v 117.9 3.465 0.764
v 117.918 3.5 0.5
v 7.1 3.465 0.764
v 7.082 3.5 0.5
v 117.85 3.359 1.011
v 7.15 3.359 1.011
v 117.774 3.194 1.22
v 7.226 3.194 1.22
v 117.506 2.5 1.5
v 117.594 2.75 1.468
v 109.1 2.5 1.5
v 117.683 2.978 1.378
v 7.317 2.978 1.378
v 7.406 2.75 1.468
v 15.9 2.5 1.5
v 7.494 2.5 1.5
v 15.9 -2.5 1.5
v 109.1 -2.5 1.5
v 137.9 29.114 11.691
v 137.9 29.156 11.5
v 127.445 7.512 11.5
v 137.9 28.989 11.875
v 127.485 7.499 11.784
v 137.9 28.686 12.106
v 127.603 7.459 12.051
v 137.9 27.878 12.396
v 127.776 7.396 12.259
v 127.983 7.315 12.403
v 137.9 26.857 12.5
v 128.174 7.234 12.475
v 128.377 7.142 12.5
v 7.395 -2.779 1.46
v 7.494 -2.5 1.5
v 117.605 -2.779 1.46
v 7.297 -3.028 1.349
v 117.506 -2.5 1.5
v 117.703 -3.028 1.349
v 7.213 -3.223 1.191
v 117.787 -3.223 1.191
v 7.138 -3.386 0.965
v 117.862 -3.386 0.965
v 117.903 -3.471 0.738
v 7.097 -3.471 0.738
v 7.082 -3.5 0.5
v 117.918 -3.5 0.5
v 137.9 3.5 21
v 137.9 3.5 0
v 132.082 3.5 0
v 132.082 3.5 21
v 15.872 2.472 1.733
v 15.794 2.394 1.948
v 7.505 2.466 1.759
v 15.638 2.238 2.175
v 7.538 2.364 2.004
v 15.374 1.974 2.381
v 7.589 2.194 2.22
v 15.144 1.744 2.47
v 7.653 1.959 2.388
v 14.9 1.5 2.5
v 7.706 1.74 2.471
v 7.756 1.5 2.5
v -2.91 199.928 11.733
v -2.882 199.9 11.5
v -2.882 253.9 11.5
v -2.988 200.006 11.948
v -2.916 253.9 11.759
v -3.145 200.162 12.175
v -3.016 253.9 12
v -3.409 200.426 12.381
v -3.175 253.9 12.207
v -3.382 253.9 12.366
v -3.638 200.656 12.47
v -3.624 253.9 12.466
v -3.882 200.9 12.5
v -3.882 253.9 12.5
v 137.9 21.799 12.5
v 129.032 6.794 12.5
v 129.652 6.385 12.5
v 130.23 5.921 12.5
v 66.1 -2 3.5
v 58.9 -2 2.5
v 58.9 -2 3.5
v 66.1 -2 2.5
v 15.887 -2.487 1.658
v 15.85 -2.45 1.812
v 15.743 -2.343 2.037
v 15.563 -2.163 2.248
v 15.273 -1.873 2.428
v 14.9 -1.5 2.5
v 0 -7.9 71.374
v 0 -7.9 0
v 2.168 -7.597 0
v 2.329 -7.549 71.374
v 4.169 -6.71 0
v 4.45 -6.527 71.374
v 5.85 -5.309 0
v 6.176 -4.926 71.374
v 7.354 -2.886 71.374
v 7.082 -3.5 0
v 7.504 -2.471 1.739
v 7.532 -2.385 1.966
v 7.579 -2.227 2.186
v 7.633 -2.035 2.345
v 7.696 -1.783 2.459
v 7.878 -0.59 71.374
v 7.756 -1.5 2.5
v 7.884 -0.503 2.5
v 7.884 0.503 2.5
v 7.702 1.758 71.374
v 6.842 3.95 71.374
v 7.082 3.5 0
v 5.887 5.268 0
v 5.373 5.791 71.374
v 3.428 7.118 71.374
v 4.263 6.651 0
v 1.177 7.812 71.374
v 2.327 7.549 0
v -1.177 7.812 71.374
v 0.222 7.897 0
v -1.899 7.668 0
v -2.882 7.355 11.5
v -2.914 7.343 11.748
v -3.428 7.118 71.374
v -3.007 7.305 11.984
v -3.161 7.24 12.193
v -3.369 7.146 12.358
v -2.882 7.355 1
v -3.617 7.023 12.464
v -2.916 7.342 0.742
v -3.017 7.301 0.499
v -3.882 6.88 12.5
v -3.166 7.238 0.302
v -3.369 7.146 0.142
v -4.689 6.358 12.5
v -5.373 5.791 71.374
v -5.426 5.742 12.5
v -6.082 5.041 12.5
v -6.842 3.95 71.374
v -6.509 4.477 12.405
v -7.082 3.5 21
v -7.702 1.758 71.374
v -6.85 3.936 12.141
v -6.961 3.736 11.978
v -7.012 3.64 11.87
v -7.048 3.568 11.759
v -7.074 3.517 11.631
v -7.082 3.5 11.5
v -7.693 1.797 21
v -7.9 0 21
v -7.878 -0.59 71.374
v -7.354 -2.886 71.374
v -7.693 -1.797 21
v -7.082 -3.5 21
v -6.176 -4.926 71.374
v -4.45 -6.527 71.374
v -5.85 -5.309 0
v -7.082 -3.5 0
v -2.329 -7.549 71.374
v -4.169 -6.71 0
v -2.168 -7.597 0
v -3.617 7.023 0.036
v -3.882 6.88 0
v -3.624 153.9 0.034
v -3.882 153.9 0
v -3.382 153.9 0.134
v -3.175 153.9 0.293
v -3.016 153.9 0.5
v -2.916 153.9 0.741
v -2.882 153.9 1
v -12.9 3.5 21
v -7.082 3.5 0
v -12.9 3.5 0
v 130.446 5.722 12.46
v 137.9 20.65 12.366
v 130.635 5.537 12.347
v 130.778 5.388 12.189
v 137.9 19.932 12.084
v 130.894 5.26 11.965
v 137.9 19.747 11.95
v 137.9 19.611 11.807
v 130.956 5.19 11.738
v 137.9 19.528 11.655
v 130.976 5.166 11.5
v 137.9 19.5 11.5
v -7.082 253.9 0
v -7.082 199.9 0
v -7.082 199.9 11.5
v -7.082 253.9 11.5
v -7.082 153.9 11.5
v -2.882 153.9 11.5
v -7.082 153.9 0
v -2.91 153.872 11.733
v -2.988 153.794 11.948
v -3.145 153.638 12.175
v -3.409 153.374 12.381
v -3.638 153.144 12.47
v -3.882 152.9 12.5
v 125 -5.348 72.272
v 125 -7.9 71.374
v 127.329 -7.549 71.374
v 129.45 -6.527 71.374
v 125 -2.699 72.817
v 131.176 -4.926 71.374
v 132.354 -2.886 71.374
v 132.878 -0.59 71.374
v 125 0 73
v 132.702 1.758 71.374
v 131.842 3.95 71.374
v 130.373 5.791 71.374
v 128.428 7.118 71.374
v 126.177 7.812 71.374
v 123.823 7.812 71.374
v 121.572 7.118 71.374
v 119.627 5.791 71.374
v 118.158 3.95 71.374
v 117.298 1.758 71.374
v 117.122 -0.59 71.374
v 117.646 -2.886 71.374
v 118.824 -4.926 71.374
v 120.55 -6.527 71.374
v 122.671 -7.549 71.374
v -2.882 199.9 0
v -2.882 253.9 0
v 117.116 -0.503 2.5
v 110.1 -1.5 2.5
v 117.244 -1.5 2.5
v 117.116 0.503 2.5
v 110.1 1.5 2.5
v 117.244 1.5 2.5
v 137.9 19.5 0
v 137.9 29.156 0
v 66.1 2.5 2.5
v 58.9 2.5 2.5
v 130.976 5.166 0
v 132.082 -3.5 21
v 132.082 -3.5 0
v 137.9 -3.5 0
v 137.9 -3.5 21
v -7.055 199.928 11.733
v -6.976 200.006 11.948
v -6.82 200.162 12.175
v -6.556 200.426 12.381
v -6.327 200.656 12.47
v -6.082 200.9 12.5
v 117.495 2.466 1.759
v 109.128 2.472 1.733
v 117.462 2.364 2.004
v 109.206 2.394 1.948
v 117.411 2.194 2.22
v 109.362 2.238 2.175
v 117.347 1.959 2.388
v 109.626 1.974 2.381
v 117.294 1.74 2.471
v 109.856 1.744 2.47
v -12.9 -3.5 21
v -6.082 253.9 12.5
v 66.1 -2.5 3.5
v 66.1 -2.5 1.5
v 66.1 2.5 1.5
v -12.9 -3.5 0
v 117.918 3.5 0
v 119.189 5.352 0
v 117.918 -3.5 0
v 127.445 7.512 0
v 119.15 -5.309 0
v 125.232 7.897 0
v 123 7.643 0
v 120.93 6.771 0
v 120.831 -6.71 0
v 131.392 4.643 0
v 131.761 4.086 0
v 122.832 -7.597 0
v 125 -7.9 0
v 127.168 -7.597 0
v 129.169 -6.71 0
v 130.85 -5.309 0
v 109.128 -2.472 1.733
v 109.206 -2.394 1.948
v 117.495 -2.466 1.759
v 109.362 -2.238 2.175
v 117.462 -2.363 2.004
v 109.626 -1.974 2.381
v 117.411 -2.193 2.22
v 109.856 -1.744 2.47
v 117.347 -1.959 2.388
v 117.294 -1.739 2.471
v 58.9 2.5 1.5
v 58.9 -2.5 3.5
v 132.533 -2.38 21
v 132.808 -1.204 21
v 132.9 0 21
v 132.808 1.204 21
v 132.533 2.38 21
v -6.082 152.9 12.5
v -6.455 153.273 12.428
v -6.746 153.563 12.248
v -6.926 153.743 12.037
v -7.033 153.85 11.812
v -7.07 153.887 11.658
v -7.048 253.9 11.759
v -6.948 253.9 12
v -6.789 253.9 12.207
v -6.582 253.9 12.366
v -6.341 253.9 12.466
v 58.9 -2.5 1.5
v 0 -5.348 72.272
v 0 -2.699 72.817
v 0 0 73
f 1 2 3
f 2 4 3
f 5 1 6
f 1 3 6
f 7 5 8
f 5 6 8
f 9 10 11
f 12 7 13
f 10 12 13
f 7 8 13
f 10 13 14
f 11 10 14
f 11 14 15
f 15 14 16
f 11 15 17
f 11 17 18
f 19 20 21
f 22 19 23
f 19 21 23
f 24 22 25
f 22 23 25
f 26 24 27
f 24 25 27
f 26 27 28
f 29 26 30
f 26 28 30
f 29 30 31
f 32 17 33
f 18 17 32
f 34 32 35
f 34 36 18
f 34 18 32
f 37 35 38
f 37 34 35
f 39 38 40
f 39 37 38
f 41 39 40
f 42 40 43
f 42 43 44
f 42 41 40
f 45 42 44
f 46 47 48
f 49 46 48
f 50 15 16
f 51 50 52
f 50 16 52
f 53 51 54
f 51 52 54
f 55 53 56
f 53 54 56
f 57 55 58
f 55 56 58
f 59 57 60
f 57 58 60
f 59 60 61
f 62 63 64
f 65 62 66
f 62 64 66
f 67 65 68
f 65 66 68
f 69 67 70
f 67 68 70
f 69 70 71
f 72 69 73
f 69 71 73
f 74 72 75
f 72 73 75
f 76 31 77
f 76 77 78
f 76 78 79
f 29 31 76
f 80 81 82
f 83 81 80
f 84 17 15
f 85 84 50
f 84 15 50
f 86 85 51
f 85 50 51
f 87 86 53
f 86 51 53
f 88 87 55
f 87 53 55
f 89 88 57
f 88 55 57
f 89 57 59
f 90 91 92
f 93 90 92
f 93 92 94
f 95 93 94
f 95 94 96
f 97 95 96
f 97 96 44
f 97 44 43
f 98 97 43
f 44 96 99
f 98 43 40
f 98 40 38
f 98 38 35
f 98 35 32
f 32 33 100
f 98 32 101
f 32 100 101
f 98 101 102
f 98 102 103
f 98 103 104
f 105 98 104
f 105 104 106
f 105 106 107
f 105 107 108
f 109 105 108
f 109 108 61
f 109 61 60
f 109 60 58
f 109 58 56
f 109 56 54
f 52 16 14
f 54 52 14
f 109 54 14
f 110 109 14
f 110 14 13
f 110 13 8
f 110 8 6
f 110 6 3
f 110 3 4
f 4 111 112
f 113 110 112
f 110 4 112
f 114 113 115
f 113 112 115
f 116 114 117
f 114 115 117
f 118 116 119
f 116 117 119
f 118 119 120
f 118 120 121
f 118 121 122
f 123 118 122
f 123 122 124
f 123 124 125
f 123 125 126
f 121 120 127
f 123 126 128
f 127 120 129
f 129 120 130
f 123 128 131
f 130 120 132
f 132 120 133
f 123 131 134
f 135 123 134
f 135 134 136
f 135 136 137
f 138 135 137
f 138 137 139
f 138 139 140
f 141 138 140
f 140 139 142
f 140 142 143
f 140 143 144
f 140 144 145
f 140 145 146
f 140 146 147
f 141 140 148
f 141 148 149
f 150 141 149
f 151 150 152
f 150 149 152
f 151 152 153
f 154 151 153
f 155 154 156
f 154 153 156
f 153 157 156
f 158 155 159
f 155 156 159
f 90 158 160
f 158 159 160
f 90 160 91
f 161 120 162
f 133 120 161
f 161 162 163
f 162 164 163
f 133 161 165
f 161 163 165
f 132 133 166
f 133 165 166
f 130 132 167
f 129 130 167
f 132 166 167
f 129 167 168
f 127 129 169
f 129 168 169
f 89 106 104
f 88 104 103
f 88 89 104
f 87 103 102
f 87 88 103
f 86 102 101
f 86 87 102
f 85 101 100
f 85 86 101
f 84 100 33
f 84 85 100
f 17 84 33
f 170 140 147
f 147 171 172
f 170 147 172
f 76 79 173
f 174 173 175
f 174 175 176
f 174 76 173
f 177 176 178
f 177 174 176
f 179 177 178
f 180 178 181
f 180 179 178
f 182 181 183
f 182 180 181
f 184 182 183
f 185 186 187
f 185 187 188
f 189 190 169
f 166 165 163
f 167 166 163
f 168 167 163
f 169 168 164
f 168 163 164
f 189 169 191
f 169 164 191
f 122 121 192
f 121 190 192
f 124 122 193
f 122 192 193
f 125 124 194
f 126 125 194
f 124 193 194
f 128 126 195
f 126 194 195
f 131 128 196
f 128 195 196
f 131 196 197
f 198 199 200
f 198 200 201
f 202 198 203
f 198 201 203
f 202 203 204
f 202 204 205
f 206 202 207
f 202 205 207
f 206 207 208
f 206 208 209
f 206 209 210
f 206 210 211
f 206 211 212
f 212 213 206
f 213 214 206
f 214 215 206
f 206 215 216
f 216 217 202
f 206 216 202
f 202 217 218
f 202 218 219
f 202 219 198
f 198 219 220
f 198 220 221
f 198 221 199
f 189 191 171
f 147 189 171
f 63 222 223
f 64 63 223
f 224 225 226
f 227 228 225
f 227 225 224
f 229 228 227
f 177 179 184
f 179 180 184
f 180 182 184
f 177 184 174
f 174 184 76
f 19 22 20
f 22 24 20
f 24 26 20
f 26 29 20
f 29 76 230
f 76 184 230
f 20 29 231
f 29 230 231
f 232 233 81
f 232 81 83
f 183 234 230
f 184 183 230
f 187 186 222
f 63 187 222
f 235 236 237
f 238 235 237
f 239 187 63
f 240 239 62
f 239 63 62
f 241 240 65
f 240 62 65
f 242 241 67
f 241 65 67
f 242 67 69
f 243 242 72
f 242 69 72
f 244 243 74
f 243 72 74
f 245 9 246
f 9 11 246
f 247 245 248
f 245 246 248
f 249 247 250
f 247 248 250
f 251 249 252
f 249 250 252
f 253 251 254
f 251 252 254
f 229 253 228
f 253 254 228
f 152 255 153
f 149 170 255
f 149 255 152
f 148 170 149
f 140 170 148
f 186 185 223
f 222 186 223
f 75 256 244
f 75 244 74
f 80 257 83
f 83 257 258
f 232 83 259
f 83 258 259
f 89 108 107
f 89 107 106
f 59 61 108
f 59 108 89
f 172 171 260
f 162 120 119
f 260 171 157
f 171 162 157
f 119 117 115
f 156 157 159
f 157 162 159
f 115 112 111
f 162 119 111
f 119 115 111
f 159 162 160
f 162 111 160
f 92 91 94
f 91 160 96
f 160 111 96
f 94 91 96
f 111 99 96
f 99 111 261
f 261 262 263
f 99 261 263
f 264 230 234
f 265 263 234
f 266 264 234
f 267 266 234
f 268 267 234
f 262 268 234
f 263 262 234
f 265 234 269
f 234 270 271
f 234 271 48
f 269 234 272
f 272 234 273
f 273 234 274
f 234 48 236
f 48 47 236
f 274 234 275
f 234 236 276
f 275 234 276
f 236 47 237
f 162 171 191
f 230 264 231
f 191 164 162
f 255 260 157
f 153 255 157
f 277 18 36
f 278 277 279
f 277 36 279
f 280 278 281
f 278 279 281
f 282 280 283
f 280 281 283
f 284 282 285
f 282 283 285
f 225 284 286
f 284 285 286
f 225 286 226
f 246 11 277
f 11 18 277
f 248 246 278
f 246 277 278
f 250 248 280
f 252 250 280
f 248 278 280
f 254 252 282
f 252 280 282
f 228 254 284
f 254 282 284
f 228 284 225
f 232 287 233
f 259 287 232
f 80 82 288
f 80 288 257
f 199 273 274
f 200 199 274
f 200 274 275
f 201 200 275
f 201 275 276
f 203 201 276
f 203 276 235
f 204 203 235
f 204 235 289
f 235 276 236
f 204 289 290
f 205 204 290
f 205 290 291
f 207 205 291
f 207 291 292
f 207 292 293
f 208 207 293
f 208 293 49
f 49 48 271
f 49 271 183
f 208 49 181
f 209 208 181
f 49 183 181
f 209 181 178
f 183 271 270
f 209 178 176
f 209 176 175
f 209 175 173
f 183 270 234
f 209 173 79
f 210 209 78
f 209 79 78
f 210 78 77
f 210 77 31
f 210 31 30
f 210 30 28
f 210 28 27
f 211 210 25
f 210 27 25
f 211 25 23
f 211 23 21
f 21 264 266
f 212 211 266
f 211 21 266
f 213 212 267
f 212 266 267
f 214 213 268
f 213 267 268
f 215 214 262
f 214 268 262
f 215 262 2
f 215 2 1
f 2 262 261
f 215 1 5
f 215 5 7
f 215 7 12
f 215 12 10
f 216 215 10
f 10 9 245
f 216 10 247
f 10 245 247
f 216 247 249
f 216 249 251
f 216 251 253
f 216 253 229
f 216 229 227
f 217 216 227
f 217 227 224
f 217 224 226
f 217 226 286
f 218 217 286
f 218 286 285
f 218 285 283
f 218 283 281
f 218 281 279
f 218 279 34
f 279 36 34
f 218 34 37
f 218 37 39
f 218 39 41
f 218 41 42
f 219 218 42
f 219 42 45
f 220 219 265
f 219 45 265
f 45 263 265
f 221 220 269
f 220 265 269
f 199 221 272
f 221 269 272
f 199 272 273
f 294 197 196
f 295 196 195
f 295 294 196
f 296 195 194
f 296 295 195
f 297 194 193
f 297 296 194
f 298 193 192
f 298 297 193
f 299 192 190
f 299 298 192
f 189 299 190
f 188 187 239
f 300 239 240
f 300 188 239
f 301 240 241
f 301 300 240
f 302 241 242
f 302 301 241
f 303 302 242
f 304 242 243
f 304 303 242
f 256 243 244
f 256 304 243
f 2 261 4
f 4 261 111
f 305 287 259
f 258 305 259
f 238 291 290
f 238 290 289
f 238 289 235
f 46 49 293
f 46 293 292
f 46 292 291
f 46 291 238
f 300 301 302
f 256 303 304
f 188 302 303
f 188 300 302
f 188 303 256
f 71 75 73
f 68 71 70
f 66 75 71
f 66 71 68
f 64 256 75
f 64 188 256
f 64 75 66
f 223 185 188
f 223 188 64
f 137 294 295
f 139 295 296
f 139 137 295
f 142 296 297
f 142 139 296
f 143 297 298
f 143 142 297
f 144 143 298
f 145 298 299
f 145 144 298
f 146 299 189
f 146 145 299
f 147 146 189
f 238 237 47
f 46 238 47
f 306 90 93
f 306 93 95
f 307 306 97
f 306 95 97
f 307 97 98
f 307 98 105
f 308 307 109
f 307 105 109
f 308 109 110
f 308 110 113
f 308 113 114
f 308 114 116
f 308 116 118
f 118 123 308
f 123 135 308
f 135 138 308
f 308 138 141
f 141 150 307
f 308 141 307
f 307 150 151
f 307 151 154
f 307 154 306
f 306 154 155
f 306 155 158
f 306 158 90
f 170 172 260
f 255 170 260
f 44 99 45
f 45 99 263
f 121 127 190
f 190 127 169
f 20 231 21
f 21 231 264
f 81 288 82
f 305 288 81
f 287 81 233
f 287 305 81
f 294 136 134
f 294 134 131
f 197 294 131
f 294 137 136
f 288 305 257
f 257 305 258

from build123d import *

# Parameters (mm, degrees)
F1_DEPTH  = 12.5
F0_W      = 4.2
F0_H      = 54
F2_DEPTH  = 21
F8_DEPTH  = 1.5
F9_R      = 1
F11_DEPTH = 1
F10_W     = 7.2
F10_H     = 5
F12_R     = 0.99999
F13_R     = 1
F13_2_R   = 1
F14_W     = 7.2
F14_H     = 0.5
F15_DEPTH = 1


# Not quite as in the source:
# - a fillet or chamfer is up to 0.001 mm smaller than in the source, because OpenCascade refuses the exact size


with BuildPart() as f1:
    # F0 (on Top) → F1 (new body)
    with BuildSketch(Plane.XY):
        with BuildLine():
            ThreePointArc((-7.0823724839, 3.5), (-5.3422902804, 5.8197881886), (-2.8823724839, 7.3554013394))
            Line((-2.8823724839, 7.3554013394), (-2.8823724839, 153.9))
            Line((-2.8823724839, 153.9), (-7.0823724839, 153.9))
            Line((-7.0823724839, 153.9), (-7.0823724839, 3.5))
        make_face()
    extrude(amount=F1_DEPTH)

    # F0 (on Top) → F2 (join)
    with BuildSketch(Plane.XY):
        with BuildLine():
            Line((-12.9, -3.5), (-7.0823724839, -3.5))
            ThreePointArc((-7.0823724839, -3.5), (-7.9, 0), (-7.0823724839, 3.5))
            Line((-7.0823724839, 3.5), (-12.9, 3.5))
            Line((-12.9, 3.5), (-12.9, -3.5))
        make_face()
    extrude(amount=F2_DEPTH)

    # F4 (on Right) → F5 (revolve)
    with BuildSketch(Plane.YZ):
        with BuildLine():
            Line((-7.9, 71.3736223973), (-7.9, 0))
            Line((-7.9, 0), (0, 0))
            Line((0, 0), (0, 73))
            ThreePointArc((0, 73), (-4.032837218, 72.5891864041), (-7.9, 71.3736223973))
        make_face()
    revolve(axis=Axis((0, 0, 36.5), (0, 0, 1)))



with BuildPart() as f1b:
    # F0 (on Top) → F1, piece 2 (new body)
    with BuildSketch(Plane.XY):
        with Locations((-4.9823724839, 226.9)):
            Rectangle(F0_W, F0_H)
    extrude(amount=F1_DEPTH)

    # F13#2
    f13_2_edges = [f1b.edges().sort_by_distance(p)[0] for p in [
        (-2.882372, 226.9, 12.5),
        (-7.082372, 226.9, 12.5),
        (-4.982372, 199.9, 12.5),
    ]]
    fillet(f13_2_edges, radius=F13_2_R)


with BuildPart() as f1c:
    # F0 (on Top) → F1, piece 3 (new body)
    with BuildSketch(Plane.XY):
        with BuildLine():
            Line((137.9, 29.1563547549), (127.4451735987, 7.5120653666))
            ThreePointArc((127.4451735987, 7.5120653666), (129.371097675, 6.5805398802), (130.9764612849, 5.1664214413))
            Line((130.9764612849, 5.1664214413), (137.9, 19.5))
            Line((137.9, 19.5), (137.9, 29.1563547549))
        make_face()
    extrude(amount=F1_DEPTH)



with BuildPart() as f2:
    # F0 (on Top) → F2, piece 2 (new body)
    with BuildSketch(Plane.XY):
        with BuildLine():
            ThreePointArc((132.9, 0), (132.6928779602, -1.7971167711), (132.0823724839, -3.5))
            Line((132.0823724839, -3.5), (137.9, -3.5))
            Line((137.9, -3.5), (137.9, 3.5))
            Line((137.9, 3.5), (132.0823724839, 3.5))
            ThreePointArc((132.0823724839, 3.5), (132.6928779602, 1.7971167711), (132.9, 0))
        make_face()
    extrude(amount=F2_DEPTH)


with BuildPart() as f1c_1:
    add(f1c.part)

    add(f2.part)  # F7 merges F2
    # F6 (on plane+point) → F7 (revolve)
    with BuildSketch(Plane.YZ.offset(125)):
        with BuildLine():
            Line((-7.9, 0), (0, 0))
            Line((0, 0), (0, 73))
            ThreePointArc((0, 73), (-4.032837218, 72.5891864041), (-7.9, 71.3736223973))
            Line((-7.9, 71.3736223973), (-7.9, 0))
        make_face()
    revolve(axis=Axis((125, 0, 36.5), (0, 0, 1)))


with BuildPart() as f1_1:
    add(f1.part)

    add(f1c_1.part)  # F8 merges F1c
    # F0 (on Top) → F8 (join)
    with BuildSketch(Plane.XY):
        with BuildLine():
            ThreePointArc((7.0823724839, 3.5), (7.6928779602, 1.7971167711), (7.9, 0))
            ThreePointArc((7.9, 0), (7.6928779602, -1.7971167711), (7.0823724839, -3.5))
            Line((7.0823724839, -3.5), (117.9176275161, -3.5))
            ThreePointArc((117.9176275161, -3.5), (117.1, 0), (117.9176275161, 3.5))
            Line((117.9176275161, 3.5), (7.0823724839, 3.5))
        make_face()
    extrude(amount=F8_DEPTH)

    # F9
    f9_edges = [f1_1.edges().sort_by_distance(p)[0] for p in [
        (62.5, -3.5, 1.5),
        (62.5, 3.5, 1.5),
    ]]
    fillet(f9_edges, radius=F9_R)

    # F10 (on face) → F11 (join)
    with BuildSketch(Plane.XY.offset(1.5)):
        with BuildLine():
            Line((15.9, 2.5), (7.4939975981, 2.5))
            ThreePointArc((7.4939975981, 2.5), (7.9, 0), (7.4939975981, -2.5))
            Line((7.4939975981, -2.5), (15.9, -2.5))
            Line((15.9, -2.5), (15.9, 2.5))
        make_face()
        with BuildLine():
            Line((117.5060024019, 2.5), (109.1, 2.5))
            Line((109.1, 2.5), (109.1, -2.5))
            Line((109.1, -2.5), (117.5060024019, -2.5))
            ThreePointArc((117.5060024019, -2.5), (117.1, 0), (117.5060024019, 2.5))
        make_face()
    extrude(amount=F11_DEPTH)

    # F12 (radius 1 in the source; OpenCascade refuses exactly that, so slightly less here)
    f12_edges = [f1_1.edges().sort_by_distance(p)[0] for p in [
        (11.696999, -2.5, 2.5),
        (15.9, 0, 2.5),
        (11.696999, 2.5, 2.5),
        (113.303001, -2.5, 2.5),
        (109.1, 0, 2.5),
        (113.303001, 2.5, 2.5),
    ]]
    fillet(f12_edges, radius=F12_R)

    # F13
    f13_edges = [f1_1.edges().sort_by_distance(p)[0] for p in [
        (-2.882372, 80.627701, 12.5),
        (-7.082372, 78.7, 12.5),
        (-2.882372, 80.627701, 0),
        (-4.982372, 153.9, 12.5),
        (134.438231, 12.333211, 12.5),
        (132.672587, 18.33421, 12.5),
    ]]
    fillet(f13_edges, radius=F13_R)


with BuildPart() as f11:
    # F10 (on face) → F11, piece 2 (new body)
    with BuildSketch(Plane.XY.offset(1.5)):
        with Locations((62.5, 0)):
            Rectangle(F10_W, F10_H)
    extrude(amount=F11_DEPTH)

    # F14 (on face) → F15 (join)
    with BuildSketch(Plane.XY.offset(2.5)):
        with Locations((62.5, -2.25)):
            Rectangle(F14_W, F14_H)
    extrude(amount=F15_DEPTH)


solid = Compound([f1b.part, f1_1.part, f11.part])
